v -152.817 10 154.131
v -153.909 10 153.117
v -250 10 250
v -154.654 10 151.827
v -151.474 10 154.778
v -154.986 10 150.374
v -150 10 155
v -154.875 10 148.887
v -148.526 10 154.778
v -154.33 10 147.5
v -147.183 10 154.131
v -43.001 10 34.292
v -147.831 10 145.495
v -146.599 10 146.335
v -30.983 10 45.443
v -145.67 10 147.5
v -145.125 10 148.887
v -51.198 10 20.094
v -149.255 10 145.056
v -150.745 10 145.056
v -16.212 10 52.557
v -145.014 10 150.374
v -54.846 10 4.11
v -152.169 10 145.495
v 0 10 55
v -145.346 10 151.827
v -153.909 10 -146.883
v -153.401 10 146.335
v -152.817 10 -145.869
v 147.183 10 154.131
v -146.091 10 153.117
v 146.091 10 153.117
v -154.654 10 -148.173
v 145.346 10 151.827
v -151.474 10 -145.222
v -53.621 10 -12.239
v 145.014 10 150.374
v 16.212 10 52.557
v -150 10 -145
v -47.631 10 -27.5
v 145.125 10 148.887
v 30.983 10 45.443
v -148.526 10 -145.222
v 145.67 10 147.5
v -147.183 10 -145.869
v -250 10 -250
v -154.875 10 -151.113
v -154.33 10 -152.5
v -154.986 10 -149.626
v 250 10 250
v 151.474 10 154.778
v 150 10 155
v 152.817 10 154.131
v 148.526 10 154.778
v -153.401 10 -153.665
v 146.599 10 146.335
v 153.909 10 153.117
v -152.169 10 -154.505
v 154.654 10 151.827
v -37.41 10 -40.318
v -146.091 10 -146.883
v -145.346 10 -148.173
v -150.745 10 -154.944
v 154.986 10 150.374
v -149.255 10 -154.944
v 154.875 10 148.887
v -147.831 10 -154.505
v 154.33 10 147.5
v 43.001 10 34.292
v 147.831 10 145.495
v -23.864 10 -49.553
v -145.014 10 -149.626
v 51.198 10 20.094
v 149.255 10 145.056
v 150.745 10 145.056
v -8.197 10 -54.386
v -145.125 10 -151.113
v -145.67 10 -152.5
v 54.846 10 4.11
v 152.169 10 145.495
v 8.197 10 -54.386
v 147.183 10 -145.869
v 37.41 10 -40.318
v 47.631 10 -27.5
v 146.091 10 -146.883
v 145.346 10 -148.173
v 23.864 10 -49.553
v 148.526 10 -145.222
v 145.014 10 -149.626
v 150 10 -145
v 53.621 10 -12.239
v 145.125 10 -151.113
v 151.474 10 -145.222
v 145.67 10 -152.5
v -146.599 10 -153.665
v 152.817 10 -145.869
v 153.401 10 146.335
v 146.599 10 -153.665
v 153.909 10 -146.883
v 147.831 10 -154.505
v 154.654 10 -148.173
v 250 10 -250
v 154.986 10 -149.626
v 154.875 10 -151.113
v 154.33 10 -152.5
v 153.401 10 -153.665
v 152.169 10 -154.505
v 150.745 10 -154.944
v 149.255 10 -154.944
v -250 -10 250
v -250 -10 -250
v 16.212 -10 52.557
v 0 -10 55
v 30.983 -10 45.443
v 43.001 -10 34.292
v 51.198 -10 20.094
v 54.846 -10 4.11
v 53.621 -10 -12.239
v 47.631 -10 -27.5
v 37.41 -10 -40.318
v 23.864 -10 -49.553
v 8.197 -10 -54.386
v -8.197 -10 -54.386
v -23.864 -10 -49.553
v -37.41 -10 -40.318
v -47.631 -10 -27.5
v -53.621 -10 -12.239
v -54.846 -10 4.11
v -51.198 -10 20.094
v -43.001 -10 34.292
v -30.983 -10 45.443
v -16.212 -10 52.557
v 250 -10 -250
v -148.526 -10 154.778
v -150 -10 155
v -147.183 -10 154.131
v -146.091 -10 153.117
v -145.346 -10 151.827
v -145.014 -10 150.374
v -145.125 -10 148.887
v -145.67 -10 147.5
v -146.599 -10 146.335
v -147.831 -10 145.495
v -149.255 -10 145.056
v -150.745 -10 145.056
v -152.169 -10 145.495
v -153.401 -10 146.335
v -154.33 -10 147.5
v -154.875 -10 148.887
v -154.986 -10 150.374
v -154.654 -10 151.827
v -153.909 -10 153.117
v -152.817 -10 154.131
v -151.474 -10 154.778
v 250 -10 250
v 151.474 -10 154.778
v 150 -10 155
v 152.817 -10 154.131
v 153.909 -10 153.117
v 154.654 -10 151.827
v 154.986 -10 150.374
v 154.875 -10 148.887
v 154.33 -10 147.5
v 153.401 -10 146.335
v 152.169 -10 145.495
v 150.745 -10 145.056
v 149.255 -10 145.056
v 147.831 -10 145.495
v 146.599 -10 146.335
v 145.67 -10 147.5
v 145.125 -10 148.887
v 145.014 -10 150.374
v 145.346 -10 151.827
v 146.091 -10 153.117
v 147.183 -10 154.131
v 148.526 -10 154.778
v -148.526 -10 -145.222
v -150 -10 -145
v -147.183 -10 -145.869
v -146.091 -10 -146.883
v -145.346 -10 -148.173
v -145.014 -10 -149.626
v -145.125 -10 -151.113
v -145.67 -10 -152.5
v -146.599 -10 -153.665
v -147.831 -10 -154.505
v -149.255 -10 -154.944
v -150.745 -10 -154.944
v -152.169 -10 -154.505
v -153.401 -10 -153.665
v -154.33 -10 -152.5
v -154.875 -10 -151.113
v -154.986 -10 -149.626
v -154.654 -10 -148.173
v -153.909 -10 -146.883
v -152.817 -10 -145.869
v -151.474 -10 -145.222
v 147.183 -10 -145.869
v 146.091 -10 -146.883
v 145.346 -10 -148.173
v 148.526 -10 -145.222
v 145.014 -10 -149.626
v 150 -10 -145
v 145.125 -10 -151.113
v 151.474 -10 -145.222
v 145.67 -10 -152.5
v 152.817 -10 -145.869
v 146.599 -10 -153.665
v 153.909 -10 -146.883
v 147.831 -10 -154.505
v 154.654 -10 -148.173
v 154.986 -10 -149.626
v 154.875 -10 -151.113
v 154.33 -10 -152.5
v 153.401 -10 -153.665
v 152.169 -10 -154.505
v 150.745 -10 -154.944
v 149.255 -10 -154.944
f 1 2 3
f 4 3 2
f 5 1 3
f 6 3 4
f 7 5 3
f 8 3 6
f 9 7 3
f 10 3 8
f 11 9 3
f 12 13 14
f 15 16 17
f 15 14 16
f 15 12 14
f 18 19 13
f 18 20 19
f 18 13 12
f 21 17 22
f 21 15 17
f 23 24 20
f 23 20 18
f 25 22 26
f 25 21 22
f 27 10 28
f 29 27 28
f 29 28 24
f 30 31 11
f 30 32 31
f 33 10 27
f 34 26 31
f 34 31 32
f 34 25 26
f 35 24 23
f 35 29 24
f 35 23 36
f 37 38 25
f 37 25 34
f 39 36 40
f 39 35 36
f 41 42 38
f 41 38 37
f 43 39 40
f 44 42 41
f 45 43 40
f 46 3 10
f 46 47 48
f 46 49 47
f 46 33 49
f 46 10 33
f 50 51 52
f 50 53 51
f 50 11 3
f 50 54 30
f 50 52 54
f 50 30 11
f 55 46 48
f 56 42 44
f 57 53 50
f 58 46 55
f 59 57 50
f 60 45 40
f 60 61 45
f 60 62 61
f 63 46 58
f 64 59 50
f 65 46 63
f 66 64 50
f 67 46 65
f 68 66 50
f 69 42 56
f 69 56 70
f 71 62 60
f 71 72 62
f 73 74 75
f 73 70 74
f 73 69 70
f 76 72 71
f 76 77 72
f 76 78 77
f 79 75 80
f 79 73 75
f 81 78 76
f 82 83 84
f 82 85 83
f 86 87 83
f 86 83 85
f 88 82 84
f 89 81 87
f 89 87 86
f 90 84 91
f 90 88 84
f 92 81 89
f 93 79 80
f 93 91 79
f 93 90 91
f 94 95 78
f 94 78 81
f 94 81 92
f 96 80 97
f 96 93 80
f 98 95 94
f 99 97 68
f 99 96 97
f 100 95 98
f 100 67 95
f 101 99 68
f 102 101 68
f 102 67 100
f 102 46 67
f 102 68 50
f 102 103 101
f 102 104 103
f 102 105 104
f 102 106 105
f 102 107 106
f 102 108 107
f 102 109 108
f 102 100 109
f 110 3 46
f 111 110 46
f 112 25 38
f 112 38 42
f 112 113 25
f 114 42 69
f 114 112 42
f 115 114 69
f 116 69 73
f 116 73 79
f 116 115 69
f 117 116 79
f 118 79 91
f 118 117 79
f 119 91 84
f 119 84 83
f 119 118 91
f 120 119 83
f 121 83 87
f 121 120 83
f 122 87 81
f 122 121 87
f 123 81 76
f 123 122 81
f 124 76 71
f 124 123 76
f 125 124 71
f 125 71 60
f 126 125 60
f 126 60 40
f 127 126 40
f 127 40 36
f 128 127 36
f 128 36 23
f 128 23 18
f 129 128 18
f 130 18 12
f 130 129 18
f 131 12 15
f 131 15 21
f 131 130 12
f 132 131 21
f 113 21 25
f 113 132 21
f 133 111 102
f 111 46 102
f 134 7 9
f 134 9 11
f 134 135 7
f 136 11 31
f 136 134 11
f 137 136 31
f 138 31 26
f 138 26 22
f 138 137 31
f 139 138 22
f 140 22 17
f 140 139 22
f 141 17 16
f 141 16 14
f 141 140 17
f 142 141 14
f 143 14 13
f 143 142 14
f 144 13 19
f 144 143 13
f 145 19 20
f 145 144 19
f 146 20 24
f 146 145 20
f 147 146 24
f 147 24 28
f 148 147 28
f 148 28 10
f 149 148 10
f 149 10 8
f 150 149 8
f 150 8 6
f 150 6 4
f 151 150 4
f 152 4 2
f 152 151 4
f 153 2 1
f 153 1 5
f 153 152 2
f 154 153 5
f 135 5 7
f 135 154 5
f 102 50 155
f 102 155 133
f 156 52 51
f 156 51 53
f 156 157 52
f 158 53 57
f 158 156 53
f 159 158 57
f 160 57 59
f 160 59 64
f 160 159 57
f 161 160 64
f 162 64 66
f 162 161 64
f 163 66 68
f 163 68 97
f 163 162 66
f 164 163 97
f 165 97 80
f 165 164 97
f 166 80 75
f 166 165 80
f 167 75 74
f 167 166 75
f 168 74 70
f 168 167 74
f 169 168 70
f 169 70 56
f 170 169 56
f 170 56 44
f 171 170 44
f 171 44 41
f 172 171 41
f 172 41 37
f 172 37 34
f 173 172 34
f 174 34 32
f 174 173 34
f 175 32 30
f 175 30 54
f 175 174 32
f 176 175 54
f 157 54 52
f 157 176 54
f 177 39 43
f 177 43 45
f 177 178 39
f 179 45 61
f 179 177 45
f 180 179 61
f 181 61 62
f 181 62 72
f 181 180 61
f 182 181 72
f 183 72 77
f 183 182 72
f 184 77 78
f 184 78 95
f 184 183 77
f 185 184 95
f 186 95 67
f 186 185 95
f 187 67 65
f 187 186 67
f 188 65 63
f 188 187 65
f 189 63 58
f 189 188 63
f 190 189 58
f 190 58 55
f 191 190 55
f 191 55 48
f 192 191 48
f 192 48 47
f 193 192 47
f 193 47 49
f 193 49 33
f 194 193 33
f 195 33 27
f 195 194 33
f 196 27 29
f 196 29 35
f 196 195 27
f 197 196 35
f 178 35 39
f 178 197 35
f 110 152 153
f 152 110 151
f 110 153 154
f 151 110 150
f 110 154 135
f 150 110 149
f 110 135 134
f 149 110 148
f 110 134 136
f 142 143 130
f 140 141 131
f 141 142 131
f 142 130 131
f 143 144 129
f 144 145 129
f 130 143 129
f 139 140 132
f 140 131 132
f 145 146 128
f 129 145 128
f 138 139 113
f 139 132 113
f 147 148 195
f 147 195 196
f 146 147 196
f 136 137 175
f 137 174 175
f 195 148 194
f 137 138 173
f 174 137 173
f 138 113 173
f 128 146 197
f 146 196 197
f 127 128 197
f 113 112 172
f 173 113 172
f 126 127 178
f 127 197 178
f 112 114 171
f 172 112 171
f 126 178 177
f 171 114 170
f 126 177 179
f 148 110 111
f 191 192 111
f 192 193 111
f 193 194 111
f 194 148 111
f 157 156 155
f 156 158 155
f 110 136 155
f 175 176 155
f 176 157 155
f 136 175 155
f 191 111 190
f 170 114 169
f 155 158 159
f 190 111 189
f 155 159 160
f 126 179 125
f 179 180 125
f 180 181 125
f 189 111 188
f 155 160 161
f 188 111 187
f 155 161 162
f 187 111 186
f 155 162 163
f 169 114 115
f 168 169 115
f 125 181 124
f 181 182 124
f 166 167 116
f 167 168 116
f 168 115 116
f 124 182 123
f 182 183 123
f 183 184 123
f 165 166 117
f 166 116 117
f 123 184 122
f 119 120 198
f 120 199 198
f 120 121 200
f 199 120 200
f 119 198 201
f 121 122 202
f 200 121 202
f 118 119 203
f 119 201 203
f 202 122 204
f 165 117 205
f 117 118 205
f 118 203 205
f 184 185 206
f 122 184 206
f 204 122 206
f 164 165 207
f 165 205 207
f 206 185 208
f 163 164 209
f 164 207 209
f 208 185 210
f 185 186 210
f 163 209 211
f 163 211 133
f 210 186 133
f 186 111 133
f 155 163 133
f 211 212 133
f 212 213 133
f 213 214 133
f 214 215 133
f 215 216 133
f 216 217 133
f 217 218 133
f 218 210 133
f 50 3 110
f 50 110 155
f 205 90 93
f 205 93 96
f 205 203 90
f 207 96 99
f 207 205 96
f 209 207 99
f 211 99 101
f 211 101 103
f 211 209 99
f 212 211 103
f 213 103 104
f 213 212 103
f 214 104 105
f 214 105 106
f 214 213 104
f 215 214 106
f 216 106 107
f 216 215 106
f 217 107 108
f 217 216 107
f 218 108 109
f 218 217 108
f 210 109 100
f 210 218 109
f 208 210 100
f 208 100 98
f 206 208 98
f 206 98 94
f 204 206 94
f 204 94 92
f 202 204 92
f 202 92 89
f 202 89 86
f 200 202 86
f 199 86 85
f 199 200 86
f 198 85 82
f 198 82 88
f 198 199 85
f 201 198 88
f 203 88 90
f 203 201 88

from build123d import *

# Parameters (mm, degrees)
SKETCH1_W           = 500
SKETCH1_H           = 500
SKETCH1_R           = 55
SKETCH1_R_2         = 5
BOSS_EXTRUDE1_DEPTH = 10


with BuildPart() as part:
    # Sketch1 → Boss-Extrude1 (new, symmetric)
    with BuildSketch(Plane(origin=(0, 0, 0), x_dir=(1, 0, 0), z_dir=(0, 1, 0))):
        Rectangle(SKETCH1_W, SKETCH1_H)
        with Locations(Location((0, 0, 0), (0, 0, 270))):
            Circle(SKETCH1_R, mode=Mode.SUBTRACT)
        with Locations(Location((-150, 150, 0), (0, 0, 270))):
            Circle(SKETCH1_R_2, mode=Mode.SUBTRACT)
        with Locations(Location((150, 150, 0), (0, 0, 270))):
            Circle(SKETCH1_R_2, mode=Mode.SUBTRACT)
        with Locations(Location((-150, -150, 0), (0, 0, 270))):
            Circle(SKETCH1_R_2, mode=Mode.SUBTRACT)
        with Locations(Location((150, -150, 0), (0, 0, 270))):
            Circle(SKETCH1_R_2, mode=Mode.SUBTRACT)
    extrude(amount=BOSS_EXTRUDE1_DEPTH, both=True)


solid = part.part
